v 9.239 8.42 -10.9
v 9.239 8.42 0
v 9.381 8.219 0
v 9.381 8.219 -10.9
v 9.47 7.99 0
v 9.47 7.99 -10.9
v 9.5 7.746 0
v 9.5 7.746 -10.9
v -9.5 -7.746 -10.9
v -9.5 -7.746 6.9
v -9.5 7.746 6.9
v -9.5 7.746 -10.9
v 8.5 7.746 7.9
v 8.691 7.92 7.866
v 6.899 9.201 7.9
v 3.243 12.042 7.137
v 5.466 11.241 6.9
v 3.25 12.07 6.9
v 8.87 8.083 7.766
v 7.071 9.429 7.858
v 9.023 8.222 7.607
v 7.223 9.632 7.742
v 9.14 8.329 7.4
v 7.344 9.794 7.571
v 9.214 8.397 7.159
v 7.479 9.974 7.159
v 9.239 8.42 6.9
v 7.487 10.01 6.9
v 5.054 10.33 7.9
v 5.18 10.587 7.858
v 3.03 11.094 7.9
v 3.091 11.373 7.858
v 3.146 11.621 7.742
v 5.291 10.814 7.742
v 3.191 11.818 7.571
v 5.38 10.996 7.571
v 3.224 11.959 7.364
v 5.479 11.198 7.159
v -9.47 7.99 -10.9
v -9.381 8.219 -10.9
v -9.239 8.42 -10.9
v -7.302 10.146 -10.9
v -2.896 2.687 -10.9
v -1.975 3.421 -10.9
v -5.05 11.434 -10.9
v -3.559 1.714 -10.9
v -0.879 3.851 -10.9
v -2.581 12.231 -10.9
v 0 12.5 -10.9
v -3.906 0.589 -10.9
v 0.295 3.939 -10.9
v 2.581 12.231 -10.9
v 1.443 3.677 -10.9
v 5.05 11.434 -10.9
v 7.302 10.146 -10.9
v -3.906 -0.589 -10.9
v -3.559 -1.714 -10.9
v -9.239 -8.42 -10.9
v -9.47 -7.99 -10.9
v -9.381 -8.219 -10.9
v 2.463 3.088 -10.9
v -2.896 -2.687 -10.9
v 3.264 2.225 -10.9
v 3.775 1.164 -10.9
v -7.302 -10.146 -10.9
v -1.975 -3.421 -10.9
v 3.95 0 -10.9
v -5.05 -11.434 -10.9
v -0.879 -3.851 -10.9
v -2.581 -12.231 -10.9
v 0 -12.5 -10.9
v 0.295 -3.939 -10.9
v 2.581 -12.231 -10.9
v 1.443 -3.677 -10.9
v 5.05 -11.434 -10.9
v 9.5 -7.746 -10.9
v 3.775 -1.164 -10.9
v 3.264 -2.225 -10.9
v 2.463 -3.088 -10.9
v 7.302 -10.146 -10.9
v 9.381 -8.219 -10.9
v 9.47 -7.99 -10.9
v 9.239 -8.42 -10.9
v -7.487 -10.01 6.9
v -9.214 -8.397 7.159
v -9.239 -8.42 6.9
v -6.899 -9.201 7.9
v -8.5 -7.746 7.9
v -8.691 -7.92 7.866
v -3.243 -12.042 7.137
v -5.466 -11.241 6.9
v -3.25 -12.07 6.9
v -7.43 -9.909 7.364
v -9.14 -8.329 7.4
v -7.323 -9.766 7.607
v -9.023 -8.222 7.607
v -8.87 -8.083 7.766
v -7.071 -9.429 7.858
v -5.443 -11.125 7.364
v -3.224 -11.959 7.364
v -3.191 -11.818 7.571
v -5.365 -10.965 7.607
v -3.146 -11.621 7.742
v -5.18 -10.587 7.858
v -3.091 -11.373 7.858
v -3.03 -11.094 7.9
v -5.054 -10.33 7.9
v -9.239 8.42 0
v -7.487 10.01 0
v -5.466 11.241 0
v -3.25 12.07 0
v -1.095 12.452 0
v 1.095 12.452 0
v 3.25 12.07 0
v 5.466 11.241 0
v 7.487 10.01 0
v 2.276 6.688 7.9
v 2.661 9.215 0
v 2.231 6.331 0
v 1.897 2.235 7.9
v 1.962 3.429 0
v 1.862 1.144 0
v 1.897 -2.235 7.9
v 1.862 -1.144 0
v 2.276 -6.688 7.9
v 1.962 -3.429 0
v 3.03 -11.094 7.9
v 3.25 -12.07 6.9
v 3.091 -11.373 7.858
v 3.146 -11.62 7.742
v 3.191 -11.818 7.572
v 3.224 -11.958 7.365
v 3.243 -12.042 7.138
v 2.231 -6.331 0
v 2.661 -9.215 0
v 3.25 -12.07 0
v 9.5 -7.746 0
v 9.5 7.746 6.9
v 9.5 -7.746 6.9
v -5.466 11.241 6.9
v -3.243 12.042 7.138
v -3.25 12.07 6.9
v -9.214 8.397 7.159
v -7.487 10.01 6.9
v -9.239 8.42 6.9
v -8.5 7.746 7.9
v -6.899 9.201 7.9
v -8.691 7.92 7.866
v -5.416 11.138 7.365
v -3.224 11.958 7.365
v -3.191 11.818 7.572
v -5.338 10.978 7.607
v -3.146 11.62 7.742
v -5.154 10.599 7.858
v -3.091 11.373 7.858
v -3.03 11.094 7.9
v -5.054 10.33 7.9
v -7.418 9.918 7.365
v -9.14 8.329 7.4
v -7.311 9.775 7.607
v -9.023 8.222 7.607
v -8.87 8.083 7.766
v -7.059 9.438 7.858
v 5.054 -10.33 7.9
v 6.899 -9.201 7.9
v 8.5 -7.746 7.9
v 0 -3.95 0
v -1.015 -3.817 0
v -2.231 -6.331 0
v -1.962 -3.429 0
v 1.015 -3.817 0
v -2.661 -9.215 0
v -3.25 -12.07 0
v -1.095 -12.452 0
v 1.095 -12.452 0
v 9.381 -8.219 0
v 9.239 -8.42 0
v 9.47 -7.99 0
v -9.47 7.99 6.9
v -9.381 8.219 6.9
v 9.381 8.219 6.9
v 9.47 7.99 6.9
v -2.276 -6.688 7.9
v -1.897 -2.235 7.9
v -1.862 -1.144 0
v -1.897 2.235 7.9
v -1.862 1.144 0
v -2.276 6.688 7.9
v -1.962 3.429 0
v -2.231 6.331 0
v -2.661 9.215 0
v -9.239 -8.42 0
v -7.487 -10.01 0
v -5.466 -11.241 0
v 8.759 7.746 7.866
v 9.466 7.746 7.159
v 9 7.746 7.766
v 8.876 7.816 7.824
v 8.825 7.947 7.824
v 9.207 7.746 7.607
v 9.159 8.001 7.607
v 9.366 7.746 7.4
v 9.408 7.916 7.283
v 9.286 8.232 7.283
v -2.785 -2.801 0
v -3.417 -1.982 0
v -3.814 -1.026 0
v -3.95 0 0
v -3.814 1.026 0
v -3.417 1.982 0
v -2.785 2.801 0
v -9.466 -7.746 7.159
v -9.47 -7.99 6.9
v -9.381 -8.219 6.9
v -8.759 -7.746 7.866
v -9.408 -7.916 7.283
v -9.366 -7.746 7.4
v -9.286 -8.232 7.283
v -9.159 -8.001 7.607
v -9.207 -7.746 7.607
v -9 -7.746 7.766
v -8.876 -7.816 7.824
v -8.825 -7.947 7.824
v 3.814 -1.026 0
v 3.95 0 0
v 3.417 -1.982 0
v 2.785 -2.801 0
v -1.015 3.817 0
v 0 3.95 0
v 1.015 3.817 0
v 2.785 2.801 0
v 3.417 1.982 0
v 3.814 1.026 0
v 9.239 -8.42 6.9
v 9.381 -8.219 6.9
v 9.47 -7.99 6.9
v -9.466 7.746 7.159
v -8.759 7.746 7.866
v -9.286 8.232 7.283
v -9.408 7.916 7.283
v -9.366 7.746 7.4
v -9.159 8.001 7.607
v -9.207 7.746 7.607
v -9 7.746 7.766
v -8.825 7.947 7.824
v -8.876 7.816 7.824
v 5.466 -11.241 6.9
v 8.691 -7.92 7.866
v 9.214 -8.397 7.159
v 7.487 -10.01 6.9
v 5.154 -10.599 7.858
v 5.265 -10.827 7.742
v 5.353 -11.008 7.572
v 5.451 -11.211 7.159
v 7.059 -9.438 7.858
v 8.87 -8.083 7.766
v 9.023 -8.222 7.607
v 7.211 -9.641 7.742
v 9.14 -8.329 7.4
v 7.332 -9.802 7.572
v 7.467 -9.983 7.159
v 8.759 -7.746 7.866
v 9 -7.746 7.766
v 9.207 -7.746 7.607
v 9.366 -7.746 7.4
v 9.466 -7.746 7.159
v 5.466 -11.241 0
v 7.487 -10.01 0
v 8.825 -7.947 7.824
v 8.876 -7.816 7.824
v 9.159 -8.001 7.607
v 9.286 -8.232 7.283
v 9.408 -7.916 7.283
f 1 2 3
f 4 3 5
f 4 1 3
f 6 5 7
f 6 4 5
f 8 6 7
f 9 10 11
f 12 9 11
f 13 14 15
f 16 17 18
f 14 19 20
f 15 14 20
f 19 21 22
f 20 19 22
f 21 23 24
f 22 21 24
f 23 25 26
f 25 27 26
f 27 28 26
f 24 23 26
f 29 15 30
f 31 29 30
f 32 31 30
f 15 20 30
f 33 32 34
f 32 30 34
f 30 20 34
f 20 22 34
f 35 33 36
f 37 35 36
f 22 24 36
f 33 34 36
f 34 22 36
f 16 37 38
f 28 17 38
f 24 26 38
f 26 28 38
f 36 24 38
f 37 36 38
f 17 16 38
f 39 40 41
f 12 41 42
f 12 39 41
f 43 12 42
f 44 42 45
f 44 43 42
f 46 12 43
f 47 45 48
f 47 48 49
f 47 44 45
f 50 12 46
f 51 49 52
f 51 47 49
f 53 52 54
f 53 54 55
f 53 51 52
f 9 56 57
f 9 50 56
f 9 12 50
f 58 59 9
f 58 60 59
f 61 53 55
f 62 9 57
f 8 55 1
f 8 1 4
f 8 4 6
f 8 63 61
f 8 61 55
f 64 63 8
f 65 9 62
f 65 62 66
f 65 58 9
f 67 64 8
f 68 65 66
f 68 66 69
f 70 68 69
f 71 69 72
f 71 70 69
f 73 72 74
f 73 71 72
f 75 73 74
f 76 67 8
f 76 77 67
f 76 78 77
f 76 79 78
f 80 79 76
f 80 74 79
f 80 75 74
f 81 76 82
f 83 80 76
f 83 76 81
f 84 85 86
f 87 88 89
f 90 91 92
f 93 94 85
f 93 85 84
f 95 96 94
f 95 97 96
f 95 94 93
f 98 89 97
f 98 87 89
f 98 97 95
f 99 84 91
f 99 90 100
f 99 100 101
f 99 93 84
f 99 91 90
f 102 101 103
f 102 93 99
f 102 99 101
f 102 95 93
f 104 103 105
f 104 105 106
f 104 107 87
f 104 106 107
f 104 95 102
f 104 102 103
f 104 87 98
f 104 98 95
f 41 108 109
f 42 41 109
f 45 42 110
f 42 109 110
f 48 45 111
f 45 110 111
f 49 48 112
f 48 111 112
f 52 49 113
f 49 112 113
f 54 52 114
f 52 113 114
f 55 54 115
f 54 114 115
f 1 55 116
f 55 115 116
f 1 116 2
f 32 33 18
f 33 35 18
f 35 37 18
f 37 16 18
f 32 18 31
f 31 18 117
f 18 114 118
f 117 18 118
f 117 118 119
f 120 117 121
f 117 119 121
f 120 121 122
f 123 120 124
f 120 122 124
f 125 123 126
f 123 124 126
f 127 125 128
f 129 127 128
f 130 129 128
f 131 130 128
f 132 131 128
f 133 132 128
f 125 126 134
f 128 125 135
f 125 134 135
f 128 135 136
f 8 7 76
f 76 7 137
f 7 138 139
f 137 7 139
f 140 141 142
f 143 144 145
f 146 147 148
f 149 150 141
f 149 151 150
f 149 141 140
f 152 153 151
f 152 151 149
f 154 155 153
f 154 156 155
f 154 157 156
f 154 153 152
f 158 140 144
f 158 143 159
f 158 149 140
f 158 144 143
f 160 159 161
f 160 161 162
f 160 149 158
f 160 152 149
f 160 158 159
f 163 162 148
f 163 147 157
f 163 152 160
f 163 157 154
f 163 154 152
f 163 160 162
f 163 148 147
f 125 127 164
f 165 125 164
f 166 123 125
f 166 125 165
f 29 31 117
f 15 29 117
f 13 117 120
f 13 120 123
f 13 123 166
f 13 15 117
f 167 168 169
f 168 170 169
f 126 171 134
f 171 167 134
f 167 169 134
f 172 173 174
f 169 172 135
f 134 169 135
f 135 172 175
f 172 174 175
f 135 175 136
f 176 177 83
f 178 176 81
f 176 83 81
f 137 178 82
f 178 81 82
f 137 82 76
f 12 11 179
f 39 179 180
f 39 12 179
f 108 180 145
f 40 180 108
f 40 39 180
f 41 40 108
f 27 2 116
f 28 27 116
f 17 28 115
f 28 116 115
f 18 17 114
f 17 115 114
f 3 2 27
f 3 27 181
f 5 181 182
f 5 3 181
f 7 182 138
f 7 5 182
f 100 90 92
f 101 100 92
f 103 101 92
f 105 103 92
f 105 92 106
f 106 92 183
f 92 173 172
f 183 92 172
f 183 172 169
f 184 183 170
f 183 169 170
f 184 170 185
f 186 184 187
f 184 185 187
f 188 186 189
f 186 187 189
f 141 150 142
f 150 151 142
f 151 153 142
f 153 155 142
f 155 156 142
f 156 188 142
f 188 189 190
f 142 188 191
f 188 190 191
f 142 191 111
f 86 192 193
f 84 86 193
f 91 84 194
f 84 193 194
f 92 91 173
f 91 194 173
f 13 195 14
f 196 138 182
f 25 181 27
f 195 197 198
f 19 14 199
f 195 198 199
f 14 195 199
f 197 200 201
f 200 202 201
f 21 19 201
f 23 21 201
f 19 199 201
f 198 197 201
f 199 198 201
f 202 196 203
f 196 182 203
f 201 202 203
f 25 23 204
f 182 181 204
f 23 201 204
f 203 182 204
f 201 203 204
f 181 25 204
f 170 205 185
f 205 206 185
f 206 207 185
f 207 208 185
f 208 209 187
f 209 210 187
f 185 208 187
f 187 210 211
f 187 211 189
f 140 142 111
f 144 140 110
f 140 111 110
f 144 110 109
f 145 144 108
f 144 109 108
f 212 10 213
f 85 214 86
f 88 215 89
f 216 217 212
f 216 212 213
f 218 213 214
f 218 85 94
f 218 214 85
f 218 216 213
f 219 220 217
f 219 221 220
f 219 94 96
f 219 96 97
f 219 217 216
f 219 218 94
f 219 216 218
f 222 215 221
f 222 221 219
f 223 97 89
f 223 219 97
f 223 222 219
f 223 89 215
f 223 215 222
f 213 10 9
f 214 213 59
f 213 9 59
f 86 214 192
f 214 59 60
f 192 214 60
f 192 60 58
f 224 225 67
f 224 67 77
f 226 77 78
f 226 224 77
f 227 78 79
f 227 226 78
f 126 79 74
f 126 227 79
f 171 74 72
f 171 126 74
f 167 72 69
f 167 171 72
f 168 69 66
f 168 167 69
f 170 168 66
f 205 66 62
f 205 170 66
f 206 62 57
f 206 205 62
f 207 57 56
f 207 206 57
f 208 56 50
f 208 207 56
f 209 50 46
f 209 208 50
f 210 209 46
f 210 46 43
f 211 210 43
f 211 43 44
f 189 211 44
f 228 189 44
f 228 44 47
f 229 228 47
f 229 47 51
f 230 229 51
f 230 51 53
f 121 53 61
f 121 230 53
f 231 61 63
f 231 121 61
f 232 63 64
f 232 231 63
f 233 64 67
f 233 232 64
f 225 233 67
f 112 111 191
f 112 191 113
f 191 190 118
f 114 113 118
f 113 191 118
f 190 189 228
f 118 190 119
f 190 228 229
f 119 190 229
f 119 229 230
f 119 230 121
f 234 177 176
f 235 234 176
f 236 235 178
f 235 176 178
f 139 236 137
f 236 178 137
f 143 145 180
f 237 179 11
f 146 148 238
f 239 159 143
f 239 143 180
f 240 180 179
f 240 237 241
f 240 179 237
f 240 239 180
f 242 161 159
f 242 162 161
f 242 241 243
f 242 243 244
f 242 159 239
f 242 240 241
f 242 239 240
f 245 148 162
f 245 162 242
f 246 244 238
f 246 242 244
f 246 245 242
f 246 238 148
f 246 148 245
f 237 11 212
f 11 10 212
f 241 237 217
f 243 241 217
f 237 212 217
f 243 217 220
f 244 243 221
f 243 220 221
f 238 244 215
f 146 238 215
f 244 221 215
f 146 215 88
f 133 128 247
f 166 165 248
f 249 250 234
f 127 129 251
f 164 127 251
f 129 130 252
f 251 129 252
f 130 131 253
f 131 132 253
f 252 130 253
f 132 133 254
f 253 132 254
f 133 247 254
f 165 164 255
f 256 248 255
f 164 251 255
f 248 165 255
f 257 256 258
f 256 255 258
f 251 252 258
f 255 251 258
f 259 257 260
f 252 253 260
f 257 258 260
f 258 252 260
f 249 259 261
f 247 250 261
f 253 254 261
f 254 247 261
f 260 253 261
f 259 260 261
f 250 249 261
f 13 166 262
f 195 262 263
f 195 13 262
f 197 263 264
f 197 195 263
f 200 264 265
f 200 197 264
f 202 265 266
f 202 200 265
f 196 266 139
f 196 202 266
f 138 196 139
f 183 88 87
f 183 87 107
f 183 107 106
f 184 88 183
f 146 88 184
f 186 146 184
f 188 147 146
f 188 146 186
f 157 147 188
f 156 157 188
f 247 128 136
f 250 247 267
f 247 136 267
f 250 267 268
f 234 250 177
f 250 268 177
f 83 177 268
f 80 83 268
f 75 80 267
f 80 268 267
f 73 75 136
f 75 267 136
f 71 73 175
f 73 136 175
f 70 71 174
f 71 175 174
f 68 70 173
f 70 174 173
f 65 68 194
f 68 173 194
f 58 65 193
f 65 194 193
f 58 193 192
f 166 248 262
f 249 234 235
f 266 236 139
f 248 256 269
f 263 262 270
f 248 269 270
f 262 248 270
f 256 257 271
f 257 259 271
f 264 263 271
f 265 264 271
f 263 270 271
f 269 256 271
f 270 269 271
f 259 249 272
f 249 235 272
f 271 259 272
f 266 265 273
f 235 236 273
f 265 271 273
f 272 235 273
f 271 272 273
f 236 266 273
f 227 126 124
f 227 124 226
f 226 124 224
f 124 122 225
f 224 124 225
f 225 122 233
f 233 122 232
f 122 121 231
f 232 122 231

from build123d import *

# Parameters (mm, degrees)
F1_DEPTH = 7.9
F2_R     = 3.95
F3_DEPTH = 10.9
F4_R     = 1
F5_R     = 1


with BuildPart() as f1:
    # F0 (on Top) → F1 (new body)
    with BuildSketch(Plane.XY):
        with BuildLine():
            Line((9.5, -8.1240384046), (9.5, 8.1240384046))
            ThreePointArc((9.5, 8.1240384046), (6.6733417963, 10.5696030801), (3.25, 12.0701077046))
            ThreePointArc((3.25, 12.0701077046), (1.85, 0), (3.25, -12.0701077046))
            ThreePointArc((3.25, -12.0701077046), (6.6733417963, -10.5696030801), (9.5, -8.1240384046))
        make_face()
    extrude(amount=F1_DEPTH)



with BuildPart() as f1b:
    # F0 (on Top) → F1, piece 2 (new body)
    with BuildSketch(Plane.XY):
        with BuildLine():
            ThreePointArc((-3.25, 12.0701077046), (-6.6733417963, 10.5696030801), (-9.5, 8.1240384046))
            Line((-9.5, 8.1240384046), (-9.5, -8.1240384046))
            ThreePointArc((-9.5, -8.1240384046), (-6.6733417963, -10.5696030801), (-3.25, -12.0701077046))
            ThreePointArc((-3.25, -12.0701077046), (-1.85, 0), (-3.25, 12.0701077046))
        make_face()
    extrude(amount=F1_DEPTH)


with BuildPart() as f1_1:
    add(f1.part)

    add(f1b.part)  # F3 merges F1b
    # F2 (on face) → F3 (join)
    with BuildSketch(Plane(origin=(0, 0, 0), x_dir=(1, 0, 0), z_dir=(0, 0, -1))):
        with BuildLine():
            Line((-9.5, 8.1240384046), (-9.5, -8.1240384046))
            ThreePointArc((-9.5, -8.1240384046), (0, -12.5), (9.5, -8.1240384046))
            Line((9.5, -8.1240384046), (9.5, 8.1240384046))
            ThreePointArc((9.5, 8.1240384046), (0, 12.5), (-9.5, 8.1240384046))
        make_face()
        Circle(F2_R, mode=Mode.SUBTRACT)
    extrude(amount=F3_DEPTH)

    # F4
    f4_edges = [f1_1.edges().sort_by_distance(p)[0] for p in [
        (-9.5, -8.124038, -1.5),
        (9.5, -8.124038, -1.5),
        (9.5, 8.124038, -1.5),
        (-9.5, 8.124038, -1.5),
    ]]
    fillet(f4_edges, radius=F4_R)

    # F5
    f5_edges = [f1_1.edges().sort_by_distance(p)[0] for p in [
        (-9.5, 0, 7.9),
        (6.505865, -10.673506, 7.9),
    ]]
    fillet(f5_edges, radius=F5_R)


solid = f1_1.part
